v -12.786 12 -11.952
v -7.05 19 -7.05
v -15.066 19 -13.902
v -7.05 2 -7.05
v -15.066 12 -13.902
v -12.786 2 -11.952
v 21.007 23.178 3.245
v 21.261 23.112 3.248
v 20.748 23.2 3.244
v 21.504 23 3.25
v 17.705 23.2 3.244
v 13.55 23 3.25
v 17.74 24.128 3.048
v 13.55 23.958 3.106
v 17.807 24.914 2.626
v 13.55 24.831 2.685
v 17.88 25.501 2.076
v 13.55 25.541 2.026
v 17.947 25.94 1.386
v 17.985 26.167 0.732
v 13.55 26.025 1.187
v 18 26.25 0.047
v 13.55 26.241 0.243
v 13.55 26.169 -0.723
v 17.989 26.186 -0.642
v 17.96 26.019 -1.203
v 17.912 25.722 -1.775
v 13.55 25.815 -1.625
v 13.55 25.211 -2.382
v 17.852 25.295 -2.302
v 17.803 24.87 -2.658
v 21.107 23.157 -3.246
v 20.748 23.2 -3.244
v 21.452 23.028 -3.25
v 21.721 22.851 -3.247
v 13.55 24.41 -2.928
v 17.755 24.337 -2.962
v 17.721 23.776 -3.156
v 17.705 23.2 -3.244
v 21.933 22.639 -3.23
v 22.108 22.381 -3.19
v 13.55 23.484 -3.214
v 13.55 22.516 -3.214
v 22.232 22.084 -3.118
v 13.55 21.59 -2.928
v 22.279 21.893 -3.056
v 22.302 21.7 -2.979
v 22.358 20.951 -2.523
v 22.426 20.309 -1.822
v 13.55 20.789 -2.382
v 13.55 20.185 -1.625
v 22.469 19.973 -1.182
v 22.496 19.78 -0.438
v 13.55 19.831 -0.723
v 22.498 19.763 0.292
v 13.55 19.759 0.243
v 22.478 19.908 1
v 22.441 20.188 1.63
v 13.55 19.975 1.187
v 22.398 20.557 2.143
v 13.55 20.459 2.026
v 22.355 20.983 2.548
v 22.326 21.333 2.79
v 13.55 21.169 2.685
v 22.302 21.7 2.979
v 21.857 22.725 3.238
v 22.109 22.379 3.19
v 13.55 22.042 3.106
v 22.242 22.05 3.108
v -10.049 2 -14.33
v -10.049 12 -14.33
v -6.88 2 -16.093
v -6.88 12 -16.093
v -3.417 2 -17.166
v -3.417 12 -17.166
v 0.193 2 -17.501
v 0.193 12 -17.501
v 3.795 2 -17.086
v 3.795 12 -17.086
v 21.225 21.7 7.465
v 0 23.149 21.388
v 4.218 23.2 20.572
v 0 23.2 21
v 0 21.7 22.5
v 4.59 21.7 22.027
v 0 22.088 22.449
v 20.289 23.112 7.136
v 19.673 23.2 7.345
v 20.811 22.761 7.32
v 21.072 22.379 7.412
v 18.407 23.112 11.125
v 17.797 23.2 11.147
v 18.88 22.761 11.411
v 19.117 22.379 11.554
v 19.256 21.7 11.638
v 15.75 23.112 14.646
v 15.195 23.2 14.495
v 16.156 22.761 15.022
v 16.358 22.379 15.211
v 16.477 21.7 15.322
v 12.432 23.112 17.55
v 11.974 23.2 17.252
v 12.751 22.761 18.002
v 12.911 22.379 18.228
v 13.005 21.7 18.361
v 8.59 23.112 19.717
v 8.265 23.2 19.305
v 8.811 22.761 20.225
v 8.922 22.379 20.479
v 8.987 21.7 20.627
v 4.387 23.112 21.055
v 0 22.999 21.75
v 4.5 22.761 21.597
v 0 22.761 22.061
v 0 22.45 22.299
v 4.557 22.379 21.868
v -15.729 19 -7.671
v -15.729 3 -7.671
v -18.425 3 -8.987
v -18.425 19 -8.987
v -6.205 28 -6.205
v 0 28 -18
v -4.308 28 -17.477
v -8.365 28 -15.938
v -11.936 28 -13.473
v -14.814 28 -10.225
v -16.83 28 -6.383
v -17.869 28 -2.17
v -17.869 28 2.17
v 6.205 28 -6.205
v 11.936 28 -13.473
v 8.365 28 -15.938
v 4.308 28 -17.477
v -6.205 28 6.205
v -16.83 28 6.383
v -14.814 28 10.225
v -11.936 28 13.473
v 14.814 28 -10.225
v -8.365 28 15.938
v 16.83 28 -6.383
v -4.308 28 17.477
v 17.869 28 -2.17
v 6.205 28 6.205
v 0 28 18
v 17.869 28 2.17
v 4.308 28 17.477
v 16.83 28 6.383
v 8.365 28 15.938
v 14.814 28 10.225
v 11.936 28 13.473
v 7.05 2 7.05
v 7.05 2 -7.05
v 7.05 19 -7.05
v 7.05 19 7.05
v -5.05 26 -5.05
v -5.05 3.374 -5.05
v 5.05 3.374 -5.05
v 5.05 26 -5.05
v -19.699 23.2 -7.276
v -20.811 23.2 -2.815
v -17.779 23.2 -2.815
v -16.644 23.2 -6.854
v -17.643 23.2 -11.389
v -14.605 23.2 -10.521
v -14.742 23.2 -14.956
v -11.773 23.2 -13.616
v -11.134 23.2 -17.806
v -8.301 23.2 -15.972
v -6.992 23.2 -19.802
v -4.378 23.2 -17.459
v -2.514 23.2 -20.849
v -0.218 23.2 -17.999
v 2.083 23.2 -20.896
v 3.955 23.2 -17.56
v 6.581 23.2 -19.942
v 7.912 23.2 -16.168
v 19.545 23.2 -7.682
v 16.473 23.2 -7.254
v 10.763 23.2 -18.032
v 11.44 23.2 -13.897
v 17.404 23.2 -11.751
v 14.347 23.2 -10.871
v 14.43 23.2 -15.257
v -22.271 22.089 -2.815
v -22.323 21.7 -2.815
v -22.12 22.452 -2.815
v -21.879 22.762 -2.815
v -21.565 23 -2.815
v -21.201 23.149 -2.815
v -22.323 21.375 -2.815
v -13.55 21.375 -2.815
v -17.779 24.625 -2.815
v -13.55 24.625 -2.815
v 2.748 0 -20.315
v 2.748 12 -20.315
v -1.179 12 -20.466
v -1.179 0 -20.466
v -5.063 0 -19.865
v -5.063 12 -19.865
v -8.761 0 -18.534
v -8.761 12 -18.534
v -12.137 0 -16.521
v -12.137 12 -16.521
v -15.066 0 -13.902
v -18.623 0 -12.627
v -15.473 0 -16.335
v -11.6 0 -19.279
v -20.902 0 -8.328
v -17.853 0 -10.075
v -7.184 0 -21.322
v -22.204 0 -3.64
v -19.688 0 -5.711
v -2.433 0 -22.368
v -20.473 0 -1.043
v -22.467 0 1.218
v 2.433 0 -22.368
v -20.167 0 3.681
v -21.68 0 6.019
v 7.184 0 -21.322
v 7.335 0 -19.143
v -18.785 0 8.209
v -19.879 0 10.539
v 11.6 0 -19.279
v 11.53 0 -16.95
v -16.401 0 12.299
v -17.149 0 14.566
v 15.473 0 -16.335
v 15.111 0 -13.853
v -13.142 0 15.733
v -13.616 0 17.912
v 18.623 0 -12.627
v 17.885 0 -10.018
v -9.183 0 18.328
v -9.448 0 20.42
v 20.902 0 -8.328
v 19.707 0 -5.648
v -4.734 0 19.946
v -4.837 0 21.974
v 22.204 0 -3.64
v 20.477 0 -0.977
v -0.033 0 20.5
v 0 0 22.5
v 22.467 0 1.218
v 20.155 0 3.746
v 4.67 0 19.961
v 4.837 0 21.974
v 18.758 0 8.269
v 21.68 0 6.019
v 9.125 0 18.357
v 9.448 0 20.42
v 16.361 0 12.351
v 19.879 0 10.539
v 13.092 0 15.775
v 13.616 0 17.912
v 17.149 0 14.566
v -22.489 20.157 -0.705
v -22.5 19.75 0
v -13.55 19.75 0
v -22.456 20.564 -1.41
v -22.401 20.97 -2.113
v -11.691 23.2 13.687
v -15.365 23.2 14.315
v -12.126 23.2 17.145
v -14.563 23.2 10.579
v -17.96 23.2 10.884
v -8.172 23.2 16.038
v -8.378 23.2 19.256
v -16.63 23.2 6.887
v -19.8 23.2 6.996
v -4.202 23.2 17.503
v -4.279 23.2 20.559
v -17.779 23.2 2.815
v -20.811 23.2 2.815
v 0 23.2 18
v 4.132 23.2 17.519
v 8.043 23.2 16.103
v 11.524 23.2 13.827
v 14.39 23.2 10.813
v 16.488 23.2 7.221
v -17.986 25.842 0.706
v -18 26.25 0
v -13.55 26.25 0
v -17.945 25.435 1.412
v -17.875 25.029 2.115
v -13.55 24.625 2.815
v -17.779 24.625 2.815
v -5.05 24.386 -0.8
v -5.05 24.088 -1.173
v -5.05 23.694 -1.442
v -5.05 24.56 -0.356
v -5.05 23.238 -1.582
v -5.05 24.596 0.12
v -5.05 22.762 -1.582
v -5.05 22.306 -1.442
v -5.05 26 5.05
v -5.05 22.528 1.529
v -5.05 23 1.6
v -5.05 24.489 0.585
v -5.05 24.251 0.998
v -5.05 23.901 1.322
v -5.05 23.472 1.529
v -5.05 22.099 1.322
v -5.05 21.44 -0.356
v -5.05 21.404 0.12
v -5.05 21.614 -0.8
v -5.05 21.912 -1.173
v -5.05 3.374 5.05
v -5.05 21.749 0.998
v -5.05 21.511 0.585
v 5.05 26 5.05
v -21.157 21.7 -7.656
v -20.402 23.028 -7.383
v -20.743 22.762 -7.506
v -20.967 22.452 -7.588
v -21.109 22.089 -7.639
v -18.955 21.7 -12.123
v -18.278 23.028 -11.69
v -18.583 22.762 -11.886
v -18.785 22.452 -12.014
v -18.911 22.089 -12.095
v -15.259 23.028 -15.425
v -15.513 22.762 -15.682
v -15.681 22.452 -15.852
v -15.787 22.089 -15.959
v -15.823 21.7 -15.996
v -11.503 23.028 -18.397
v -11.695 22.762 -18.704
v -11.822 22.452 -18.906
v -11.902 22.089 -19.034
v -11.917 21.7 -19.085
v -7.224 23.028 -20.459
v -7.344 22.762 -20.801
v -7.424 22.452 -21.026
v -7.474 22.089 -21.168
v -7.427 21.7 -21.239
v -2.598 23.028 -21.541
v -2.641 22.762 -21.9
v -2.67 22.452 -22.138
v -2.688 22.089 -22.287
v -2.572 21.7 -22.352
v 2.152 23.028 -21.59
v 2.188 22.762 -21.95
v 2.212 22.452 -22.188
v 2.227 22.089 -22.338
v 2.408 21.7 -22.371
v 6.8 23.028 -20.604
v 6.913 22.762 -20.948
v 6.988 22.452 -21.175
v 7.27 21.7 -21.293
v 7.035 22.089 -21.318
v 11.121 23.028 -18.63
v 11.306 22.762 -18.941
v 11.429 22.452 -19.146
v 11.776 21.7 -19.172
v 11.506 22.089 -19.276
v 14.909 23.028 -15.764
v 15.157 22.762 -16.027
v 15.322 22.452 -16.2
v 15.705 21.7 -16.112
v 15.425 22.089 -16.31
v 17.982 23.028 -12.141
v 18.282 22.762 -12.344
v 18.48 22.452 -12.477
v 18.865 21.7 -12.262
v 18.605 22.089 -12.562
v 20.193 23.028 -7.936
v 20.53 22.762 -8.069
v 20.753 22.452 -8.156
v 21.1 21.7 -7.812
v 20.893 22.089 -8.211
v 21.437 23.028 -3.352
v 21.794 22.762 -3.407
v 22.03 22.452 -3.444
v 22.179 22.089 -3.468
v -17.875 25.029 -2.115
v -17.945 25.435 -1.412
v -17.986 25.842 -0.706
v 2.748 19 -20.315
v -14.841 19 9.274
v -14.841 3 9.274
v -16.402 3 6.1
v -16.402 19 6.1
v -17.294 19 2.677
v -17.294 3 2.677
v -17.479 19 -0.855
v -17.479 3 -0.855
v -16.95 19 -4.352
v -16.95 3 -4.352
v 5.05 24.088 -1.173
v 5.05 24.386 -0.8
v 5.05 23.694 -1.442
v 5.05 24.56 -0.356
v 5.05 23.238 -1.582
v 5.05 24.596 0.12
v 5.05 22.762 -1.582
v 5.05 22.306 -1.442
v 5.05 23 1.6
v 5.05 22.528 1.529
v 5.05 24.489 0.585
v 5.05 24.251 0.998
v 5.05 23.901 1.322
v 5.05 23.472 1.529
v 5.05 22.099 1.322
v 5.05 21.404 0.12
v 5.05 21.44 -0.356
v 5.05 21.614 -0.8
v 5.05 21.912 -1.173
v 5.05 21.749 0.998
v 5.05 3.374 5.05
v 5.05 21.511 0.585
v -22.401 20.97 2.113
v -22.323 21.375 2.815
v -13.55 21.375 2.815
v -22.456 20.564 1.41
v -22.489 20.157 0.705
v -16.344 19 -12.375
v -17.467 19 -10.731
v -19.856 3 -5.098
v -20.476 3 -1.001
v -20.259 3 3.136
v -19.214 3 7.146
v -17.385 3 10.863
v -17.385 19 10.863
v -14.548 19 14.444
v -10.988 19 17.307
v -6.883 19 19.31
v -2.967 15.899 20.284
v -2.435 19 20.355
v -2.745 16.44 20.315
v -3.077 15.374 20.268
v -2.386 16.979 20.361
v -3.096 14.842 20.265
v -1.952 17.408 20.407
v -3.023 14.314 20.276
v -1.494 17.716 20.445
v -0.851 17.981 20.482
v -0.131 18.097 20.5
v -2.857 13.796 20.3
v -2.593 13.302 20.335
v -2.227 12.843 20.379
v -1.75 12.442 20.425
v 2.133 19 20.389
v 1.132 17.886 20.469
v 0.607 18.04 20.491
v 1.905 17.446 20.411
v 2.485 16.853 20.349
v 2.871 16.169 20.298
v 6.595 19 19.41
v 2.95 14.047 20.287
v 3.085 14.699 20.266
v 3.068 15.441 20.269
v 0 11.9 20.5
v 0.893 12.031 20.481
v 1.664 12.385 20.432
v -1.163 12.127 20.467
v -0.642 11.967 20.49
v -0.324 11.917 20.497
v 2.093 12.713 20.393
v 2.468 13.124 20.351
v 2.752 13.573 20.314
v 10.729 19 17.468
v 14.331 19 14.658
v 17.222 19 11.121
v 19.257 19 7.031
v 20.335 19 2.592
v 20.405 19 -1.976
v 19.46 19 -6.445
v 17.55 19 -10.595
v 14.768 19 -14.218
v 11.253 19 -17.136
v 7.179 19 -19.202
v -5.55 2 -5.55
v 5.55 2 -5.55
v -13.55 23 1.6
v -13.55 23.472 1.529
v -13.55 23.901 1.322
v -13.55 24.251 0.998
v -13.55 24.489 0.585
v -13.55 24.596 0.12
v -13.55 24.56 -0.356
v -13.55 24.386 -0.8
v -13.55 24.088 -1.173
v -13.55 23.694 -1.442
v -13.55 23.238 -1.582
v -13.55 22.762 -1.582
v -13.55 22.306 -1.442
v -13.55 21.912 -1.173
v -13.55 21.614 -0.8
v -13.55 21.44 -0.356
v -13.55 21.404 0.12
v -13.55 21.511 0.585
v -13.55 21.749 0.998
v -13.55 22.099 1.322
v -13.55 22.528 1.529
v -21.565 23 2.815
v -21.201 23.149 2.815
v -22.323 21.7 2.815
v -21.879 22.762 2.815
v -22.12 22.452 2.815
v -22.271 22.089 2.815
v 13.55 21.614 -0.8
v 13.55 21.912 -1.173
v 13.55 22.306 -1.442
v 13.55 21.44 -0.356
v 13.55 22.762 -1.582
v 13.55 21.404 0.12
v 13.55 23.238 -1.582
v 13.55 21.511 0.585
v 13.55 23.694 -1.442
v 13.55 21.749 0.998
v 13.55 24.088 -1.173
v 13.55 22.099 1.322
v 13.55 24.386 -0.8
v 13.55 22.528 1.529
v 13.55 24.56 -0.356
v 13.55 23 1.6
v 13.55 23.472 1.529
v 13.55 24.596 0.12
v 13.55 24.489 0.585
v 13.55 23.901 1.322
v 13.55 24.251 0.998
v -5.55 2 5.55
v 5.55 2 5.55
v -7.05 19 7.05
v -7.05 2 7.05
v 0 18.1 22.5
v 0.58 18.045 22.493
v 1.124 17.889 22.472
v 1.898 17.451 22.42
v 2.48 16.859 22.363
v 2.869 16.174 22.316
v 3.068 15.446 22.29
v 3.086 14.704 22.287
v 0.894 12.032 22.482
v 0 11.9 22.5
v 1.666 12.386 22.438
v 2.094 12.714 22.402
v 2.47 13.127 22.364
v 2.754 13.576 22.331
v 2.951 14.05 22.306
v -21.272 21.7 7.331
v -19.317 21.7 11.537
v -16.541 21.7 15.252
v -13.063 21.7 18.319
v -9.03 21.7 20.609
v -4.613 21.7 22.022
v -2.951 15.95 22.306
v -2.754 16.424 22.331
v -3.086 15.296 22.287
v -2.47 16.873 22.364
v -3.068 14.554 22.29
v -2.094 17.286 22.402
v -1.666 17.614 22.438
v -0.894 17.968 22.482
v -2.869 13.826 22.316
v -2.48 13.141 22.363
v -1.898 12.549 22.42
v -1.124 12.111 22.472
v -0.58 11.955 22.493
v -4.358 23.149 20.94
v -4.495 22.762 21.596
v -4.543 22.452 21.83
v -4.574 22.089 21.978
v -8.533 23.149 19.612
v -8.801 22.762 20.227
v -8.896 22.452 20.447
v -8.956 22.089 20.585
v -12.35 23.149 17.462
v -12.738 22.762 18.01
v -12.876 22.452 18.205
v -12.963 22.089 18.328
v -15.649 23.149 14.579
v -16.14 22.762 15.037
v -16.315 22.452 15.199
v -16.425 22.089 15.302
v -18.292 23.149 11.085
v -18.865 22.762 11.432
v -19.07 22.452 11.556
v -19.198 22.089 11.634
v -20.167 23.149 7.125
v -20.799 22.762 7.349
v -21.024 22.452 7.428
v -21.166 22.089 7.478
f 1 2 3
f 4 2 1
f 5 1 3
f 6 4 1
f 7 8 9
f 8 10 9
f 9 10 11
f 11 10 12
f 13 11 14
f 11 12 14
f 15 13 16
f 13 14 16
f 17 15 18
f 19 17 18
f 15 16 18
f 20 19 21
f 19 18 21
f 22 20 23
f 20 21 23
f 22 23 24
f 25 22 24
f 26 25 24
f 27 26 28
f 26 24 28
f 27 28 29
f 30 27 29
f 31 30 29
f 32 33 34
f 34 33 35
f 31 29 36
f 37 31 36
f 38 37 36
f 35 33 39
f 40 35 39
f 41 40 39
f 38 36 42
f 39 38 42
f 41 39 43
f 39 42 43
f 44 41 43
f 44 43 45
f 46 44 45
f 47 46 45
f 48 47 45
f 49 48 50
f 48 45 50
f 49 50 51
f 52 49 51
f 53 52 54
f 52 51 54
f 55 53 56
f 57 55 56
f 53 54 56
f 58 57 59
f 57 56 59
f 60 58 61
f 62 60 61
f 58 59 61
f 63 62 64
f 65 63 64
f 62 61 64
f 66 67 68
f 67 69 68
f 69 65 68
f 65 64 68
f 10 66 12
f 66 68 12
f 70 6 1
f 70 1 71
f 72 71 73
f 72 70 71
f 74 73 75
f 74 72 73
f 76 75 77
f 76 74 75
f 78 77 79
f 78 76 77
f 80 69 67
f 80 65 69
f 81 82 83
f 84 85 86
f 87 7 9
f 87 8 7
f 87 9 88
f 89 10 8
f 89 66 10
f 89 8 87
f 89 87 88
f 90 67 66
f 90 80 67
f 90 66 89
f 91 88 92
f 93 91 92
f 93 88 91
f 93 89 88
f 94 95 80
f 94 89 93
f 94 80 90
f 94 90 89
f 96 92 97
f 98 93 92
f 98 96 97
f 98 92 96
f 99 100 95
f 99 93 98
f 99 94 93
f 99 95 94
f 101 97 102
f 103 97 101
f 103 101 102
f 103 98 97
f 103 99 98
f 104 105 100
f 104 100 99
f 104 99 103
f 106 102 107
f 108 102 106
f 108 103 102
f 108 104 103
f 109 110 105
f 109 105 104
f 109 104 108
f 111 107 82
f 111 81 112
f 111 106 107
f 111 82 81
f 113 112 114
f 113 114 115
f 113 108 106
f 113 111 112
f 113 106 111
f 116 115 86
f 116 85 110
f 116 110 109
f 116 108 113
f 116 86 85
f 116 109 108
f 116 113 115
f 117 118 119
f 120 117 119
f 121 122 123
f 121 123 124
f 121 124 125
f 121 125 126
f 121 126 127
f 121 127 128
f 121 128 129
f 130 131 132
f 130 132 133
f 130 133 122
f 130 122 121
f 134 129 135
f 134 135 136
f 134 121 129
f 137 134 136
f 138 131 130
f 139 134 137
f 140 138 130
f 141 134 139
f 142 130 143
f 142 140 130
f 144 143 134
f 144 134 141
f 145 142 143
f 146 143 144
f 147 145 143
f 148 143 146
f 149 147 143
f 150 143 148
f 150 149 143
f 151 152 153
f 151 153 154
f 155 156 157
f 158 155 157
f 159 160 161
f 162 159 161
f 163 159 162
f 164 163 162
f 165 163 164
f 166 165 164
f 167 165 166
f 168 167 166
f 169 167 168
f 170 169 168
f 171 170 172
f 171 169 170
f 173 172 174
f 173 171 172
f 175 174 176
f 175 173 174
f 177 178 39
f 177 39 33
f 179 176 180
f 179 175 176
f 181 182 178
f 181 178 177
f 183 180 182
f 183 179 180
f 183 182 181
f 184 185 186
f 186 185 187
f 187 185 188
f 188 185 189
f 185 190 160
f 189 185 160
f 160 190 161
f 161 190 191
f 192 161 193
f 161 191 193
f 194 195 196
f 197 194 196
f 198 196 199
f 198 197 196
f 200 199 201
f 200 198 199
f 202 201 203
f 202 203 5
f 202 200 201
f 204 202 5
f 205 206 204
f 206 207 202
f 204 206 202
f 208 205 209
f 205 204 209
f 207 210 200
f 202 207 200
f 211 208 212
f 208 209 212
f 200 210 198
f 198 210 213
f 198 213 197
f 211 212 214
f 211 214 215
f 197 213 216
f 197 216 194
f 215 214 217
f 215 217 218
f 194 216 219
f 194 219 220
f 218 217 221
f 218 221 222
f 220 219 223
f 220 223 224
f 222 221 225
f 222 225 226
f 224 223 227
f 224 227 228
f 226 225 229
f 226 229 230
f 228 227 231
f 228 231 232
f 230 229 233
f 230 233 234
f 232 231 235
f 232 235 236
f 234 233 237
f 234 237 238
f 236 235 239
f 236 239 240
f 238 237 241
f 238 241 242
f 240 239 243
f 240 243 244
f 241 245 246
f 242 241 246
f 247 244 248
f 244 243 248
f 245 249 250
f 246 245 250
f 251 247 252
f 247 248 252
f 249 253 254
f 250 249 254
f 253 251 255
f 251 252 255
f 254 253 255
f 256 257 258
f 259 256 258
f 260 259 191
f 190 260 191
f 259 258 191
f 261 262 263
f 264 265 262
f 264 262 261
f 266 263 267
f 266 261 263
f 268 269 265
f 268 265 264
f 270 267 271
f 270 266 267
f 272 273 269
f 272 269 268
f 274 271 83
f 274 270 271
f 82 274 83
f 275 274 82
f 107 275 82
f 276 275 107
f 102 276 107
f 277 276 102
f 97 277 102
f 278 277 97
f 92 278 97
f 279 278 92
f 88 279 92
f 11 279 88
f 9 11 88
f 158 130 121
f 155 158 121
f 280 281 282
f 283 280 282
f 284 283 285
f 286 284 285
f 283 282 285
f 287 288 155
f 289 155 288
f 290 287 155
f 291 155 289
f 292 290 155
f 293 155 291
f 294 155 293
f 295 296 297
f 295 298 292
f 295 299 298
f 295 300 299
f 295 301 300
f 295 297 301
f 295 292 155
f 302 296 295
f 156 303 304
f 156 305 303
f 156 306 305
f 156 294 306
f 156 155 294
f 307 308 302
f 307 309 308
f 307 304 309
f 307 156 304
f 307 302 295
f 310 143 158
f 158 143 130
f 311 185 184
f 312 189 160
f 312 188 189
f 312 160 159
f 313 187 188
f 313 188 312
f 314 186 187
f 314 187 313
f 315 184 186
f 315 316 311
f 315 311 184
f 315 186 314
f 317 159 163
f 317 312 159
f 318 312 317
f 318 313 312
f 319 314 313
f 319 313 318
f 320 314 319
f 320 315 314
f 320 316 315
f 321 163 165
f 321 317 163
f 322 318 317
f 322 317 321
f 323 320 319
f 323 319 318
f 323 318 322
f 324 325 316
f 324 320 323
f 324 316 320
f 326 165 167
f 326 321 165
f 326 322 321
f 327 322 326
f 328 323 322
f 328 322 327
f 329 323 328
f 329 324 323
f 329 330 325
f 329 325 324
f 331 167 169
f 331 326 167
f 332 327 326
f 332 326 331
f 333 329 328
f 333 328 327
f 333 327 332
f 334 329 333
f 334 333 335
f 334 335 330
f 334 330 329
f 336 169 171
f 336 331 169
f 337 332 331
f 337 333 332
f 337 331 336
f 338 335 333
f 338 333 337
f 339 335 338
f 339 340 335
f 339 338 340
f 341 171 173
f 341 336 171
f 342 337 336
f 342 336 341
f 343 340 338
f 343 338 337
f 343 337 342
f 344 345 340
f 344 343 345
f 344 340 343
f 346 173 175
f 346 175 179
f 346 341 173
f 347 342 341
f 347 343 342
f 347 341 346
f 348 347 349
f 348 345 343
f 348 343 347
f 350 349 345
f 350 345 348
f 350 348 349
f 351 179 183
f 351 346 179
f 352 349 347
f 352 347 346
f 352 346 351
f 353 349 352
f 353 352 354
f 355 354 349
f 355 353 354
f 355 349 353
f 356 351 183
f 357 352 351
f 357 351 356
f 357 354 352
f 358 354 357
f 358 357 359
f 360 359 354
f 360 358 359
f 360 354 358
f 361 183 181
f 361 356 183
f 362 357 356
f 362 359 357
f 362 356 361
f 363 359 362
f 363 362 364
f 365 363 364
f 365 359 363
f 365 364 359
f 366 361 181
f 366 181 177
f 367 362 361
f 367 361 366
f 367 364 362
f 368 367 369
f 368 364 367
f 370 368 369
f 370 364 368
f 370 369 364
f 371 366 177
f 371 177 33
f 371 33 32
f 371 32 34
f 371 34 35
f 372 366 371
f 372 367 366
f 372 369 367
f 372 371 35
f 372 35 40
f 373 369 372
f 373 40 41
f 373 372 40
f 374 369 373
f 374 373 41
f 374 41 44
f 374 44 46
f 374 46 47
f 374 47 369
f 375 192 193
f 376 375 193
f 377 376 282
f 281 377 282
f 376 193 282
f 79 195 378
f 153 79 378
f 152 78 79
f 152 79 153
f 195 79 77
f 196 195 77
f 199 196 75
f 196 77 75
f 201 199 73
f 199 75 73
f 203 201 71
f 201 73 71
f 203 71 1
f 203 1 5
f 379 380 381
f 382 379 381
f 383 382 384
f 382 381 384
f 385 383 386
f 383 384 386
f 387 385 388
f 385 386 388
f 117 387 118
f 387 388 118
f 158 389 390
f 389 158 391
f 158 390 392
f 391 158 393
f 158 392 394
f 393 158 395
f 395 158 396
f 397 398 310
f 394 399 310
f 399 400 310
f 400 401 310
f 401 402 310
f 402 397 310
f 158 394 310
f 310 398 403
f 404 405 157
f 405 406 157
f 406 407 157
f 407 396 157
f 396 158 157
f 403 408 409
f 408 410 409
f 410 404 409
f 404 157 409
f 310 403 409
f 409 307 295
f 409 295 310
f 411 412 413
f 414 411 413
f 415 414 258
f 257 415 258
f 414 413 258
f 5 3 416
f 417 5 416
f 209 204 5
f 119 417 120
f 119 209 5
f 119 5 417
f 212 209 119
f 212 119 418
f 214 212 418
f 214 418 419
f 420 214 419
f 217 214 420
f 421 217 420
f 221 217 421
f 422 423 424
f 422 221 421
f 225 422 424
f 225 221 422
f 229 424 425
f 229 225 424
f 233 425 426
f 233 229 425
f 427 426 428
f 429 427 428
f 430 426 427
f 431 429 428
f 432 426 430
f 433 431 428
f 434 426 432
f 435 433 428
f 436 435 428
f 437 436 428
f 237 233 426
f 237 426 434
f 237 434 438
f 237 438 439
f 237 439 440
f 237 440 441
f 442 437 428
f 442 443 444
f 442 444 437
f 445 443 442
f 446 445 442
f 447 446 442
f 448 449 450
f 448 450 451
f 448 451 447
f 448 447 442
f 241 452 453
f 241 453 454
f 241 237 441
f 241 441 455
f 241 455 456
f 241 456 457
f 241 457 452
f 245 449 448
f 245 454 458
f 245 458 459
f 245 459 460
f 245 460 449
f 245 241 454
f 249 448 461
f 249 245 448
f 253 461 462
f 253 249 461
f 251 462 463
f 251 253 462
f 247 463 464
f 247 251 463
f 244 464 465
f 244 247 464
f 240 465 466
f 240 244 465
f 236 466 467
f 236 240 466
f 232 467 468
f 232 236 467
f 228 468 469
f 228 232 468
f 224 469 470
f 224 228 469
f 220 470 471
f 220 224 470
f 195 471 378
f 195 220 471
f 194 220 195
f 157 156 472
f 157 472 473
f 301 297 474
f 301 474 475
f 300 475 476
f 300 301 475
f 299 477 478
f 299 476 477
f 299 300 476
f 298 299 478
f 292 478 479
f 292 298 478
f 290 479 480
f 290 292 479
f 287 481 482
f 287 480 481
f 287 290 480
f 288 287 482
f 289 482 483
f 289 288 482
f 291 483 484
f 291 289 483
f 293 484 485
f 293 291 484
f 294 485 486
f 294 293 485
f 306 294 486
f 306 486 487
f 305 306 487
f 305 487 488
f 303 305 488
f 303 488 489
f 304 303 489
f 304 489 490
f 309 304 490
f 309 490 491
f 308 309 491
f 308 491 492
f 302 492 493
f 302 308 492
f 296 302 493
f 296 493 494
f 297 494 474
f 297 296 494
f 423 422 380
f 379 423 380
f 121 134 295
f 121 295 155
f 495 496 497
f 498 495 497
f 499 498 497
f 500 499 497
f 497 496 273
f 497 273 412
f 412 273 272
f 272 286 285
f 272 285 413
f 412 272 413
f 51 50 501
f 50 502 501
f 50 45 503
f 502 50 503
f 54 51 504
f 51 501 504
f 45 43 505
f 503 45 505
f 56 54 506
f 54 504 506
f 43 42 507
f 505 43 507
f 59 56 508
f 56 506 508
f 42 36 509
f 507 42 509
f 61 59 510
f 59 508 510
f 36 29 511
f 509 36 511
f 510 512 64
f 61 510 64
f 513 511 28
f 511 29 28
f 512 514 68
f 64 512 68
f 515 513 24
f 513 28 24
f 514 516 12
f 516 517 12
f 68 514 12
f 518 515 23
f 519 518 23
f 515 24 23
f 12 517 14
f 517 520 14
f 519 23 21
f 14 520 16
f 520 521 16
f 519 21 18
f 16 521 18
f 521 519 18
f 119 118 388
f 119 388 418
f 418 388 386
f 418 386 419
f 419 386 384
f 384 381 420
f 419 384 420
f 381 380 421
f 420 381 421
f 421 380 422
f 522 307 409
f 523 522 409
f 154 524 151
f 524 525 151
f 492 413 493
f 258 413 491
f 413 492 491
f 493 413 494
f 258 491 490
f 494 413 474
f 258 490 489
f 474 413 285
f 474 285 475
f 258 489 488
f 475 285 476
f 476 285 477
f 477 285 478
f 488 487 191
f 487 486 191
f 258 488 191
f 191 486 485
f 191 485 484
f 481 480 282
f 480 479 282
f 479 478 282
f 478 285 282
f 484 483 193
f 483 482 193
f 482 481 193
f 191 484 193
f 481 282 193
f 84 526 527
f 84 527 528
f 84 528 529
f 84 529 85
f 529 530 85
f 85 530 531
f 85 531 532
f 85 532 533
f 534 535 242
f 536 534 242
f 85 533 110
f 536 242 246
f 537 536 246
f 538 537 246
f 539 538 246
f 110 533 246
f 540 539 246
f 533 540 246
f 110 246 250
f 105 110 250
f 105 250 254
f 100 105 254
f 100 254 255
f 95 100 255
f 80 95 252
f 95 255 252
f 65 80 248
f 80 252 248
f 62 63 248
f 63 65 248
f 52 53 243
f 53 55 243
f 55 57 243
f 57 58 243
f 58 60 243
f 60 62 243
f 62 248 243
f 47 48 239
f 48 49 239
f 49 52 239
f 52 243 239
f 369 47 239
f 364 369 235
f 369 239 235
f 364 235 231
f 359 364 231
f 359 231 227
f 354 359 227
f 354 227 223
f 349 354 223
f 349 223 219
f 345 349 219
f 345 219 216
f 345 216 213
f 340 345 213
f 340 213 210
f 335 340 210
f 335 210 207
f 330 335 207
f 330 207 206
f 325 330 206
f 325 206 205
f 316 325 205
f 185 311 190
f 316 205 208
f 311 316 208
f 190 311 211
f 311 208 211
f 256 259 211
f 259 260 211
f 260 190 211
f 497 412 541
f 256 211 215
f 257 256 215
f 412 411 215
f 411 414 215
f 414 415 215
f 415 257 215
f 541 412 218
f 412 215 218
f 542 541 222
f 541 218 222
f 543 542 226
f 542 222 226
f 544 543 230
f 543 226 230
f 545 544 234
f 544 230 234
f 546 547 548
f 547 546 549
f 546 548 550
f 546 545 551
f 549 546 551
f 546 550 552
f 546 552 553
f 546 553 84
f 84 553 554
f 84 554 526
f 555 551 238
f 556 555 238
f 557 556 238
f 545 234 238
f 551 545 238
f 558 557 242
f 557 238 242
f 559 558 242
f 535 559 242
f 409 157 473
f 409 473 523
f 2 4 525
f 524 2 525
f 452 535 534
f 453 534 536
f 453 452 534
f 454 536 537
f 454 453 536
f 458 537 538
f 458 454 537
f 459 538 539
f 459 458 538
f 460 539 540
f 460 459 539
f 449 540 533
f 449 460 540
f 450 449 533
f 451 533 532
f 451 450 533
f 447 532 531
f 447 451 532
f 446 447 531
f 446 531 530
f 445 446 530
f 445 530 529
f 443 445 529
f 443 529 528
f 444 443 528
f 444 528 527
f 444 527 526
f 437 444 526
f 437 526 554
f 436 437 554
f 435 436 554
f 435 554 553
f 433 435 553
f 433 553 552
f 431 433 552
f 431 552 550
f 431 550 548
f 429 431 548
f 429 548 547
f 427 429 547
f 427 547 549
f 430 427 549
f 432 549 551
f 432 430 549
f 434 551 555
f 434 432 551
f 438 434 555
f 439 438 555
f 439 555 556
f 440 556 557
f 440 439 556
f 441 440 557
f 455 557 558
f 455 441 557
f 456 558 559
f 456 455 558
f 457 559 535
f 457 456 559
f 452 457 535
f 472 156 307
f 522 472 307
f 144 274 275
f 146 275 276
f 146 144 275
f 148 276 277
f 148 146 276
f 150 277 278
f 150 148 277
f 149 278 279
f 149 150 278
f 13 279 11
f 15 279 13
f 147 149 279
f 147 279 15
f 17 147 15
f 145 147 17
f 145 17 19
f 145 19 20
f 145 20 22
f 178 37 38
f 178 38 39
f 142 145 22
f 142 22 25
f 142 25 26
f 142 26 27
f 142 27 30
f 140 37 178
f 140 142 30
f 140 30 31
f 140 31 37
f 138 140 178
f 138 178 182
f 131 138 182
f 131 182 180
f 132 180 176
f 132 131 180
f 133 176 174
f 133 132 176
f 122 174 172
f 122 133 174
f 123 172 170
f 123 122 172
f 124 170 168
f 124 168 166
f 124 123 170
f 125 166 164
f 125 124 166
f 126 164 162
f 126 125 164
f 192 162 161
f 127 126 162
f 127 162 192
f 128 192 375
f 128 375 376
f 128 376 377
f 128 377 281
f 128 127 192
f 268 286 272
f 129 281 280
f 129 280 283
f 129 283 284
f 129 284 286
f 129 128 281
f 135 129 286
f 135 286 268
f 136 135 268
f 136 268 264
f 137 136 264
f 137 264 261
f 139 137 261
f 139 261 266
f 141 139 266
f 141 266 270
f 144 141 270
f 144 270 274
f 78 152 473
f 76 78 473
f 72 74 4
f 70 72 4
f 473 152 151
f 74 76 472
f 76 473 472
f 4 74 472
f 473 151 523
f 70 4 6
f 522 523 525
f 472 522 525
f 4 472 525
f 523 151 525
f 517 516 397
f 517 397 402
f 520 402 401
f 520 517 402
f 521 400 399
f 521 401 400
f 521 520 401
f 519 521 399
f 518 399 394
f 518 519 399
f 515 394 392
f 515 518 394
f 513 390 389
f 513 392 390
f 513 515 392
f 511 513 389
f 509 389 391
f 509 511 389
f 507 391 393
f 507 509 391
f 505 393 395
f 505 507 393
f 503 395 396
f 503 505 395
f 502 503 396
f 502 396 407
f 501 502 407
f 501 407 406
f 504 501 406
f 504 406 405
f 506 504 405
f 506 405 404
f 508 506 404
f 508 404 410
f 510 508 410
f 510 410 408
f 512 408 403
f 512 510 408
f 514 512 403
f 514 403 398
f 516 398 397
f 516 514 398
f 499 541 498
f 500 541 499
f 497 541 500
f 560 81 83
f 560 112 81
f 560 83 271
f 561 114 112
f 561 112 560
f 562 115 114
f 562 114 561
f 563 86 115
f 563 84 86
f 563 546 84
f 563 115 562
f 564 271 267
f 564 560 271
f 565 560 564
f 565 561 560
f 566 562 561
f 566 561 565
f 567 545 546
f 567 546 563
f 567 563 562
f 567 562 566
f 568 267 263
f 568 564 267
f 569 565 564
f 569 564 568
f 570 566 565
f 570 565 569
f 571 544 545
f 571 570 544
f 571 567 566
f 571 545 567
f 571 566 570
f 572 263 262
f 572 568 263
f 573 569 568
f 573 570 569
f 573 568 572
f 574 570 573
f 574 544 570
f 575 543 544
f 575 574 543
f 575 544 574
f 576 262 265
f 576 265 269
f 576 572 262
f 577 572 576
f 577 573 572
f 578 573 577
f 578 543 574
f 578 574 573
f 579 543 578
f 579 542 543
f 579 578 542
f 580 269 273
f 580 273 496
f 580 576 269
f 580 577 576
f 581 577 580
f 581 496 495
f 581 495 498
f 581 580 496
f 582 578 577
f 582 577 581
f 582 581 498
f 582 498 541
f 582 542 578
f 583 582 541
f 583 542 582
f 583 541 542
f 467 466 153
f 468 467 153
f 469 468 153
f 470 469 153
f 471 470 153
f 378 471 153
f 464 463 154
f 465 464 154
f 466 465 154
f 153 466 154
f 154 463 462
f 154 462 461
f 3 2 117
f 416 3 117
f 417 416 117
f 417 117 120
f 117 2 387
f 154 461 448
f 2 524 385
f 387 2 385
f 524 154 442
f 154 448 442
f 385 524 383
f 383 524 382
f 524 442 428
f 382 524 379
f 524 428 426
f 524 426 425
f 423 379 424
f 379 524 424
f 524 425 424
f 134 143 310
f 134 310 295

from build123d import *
from OCP.BRepFilletAPI import BRepFilletAPI_MakeChamfer

# Parameters (mm, degrees)
SKETCH1_R                = 22.5
BOSS_EXTRUDE1_DEPTH      = 28
SKETCH2_W                = 10.1
SKETCH2_H                = 10.1
CUT_EXTRUDE2_DEPTH       = 43.385138905
SHELL3_T                 = -2
SKETCH3_R                = 3.1
CUT_EXTRUDE3_DEPTH       = 47.51292831
CHAMFER1_SIZE            = 2
CHAMFER1_SIZE2           = 1.154700538
BOSS_EXTRUDE8_START      = 23
BOSS_EXTRUDE8_DEPTH      = 23
BOSS_EXTRUDE4_DEPTH      = 20
BOSS_EXTRUDE6_DEPTH      = 26
CUT_EXTRUDE5_DEPTH       = 12
CUT_EXTRUDE9_DEPTH       = 2
BOSS_EXTRUDE10_START     = 7
BOSS_EXTRUDE10_DEPTH     = 7
SKETCH21_OUTSIDE_W       = 61.262
SKETCH21_OUTSIDE_H       = 63.965
SKETCH21_OUTSIDE_R       = 18
CUT_EXTRUDE11_DEPTH      = 4.8
CUT_EXTRUDE12_DEPTH      = 47.67125763
CUT_EXTRUDE12_DEPTH_BACK = 47.67125763
SKETCH22_R               = 1.6
CUT_EXTRUDE13_START      = -8.5
SKETCH24_R               = 3.25
CUT_EXTRUDE13_DEPTH      = 39.17125769
CUT_EXTRUDE14_START      = -8.5
CUT_EXTRUDE14_DEPTH      = 39.171257692
FILLET1_R                = 1.5
SKETCH26_R               = 43.919943133
SKETCH26_R_2             = 22.5
CUT_EXTRUDE15_DEPTH      = 44.879993089
CHAMFER2_SIZE            = 0.5
CHAMFER2_SIZE2           = 1.37373871


with BuildPart() as part:
    # Sketch1 → Boss-Extrude1 (new body)
    with BuildSketch(Plane(origin=(0, 0, 0), x_dir=(1, 0, 0), z_dir=(0, 1, 0))):
        with Locations(Location((0, 0, 0), (0, 0, 270))):
            Circle(SKETCH1_R)
    extrude(amount=BOSS_EXTRUDE1_DEPTH)

    # Sketch2 → Cut-Extrude2 (cut, through all)
    with BuildSketch(Plane.XZ):
        Rectangle(SKETCH2_W, SKETCH2_H)
    extrude(amount=-CUT_EXTRUDE2_DEPTH, mode=Mode.SUBTRACT)

    # Shell3
    shell3_openings = [part.faces().sort_by_distance(p)[0] for p in [
        (0, 0, -21.863603897),
    ]]
    offset(amount=SHELL3_T, openings=shell3_openings, kind=Kind.INTERSECTION)

    # Sketch3 → Cut-Extrude3 (cut, through all)
    with BuildSketch(Plane.XY.offset(7.05)):
        with Locations(Location((0, 15, 0), (0, 0, 270.000000016))):
            Circle(SKETCH3_R)
    extrude(amount=CUT_EXTRUDE3_DEPTH, mode=Mode.SUBTRACT)

    # Chamfer1: one chamfer whose edges measure the first distance from different faces: ONE call of the kernel's chamfer builder (chamfer() names one face for all edges)
    chamfer1_edges_1 = [part.edges().sort_by_distance(p)[0] for p in [
        (5.05, 28, 0),
    ]]
    chamfer1_side_1 = [part.faces().sort_by_distance(p)[0] for p in [
        (5.05, 14, 0),
    ]]
    chamfer1_edges_2 = [part.edges().sort_by_distance(p)[0] for p in [
        (0, 28, -5.05),
    ]]
    chamfer1_side_2 = [part.faces().sort_by_distance(p)[0] for p in [
        (0, 14, -5.05),
    ]]
    chamfer1_edges_3 = [part.edges().sort_by_distance(p)[0] for p in [
        (-5.05, 28, 0),
    ]]
    chamfer1_side_3 = [part.faces().sort_by_distance(p)[0] for p in [
        (-5.05, 14, 0),
    ]]
    chamfer1_edges_4 = [part.edges().sort_by_distance(p)[0] for p in [
        (0, 28, 5.05),
    ]]
    chamfer1_side_4 = [part.faces().sort_by_distance(p)[0] for p in [
        (0, 14, 5.05),
    ]]
    chamfer1 = BRepFilletAPI_MakeChamfer(part.part.solid().wrapped)
    for e in chamfer1_edges_1:
        chamfer1.Add(CHAMFER1_SIZE, CHAMFER1_SIZE2, e.wrapped, chamfer1_side_1[0].wrapped)  # the first distance lies on this face
    for e in chamfer1_edges_2:
        chamfer1.Add(CHAMFER1_SIZE, CHAMFER1_SIZE2, e.wrapped, chamfer1_side_2[0].wrapped)  # the first distance lies on this face
    for e in chamfer1_edges_3:
        chamfer1.Add(CHAMFER1_SIZE, CHAMFER1_SIZE2, e.wrapped, chamfer1_side_3[0].wrapped)  # the first distance lies on this face
    for e in chamfer1_edges_4:
        chamfer1.Add(CHAMFER1_SIZE, CHAMFER1_SIZE2, e.wrapped, chamfer1_side_4[0].wrapped)  # the first distance lies on this face
    add(Compound.cast(chamfer1.Shape()), mode=Mode.REPLACE)

    # Sketch18 → Boss-Extrude8 (add)
    with BuildSketch(Plane.XZ.offset(-26).offset(BOSS_EXTRUDE8_START)):
        with BuildLine():
            Line((-15.72889581, -7.671495069), (-18.425277949, -8.986608509))
            ThreePointArc((-18.425277949, -8.986608509), (-20.471905462, 1.072887103), (-17.384985971, 10.863344917))
            Line((-17.384985971, 10.863344917), (-14.840841683, 9.273587124))
            ThreePointArc((-14.840841683, 9.273587124), (-17.476016858, 0.915879234), (-15.72889581, -7.671495069))
        make_face()
    extrude(amount=-BOSS_EXTRUDE8_DEPTH)

    # Sketch9 → Boss-Extrude4 (add)
    with BuildSketch(Plane.XZ):
        Polygon((2.070380013, -22.404542544), (-16.587666088, -15.201951643), (-17.668054723, -18.000658558), (0.989991378, -25.203249459), align=None)
    extrude(amount=-BOSS_EXTRUDE4_DEPTH)

    # Sketch11 → Boss-Extrude6 (add)
    with BuildSketch(Plane.XZ):
        with BuildLine():
            Line((2.070380013, -22.404542544), (7.05, -7.05))
            Line((7.05, -7.05), (-7.05, -7.05))
            Line((-7.05, -7.05), (-16.587666088, -15.201951643))
            ThreePointArc((-16.587666088, -15.201951643), (-8.102914764, -20.990301864), (2.070380013, -22.404542544))
        make_face()
    extrude(amount=-BOSS_EXTRUDE6_DEPTH)

    # Sketch12 → Cut-Extrude5 (cut)
    with BuildSketch(Plane.XZ):
        with BuildLine():
            Line((3.795196001, -17.086112517), (2.74804579, -20.314975863))
            ThreePointArc((2.74804579, -20.314975863), (-6.94389773, -19.288138436), (-15.066327631, -13.901646367))
            Line((-15.066327631, -13.901646367), (-12.785820172, -11.952470714))
            ThreePointArc((-12.785820172, -11.952470714), (-5.176523958, -16.719520129), (3.795196001, -17.086112517))
        make_face()
    extrude(amount=-CUT_EXTRUDE5_DEPTH, mode=Mode.SUBTRACT)

    # Sketch17 → Cut-Extrude9 (cut)
    with BuildSketch(Plane.XZ):
        with BuildLine():
            Line((7.05, 7.05), (7.05, -7.05))
            Line((7.05, -7.05), (3.795196001, -17.086112517))
            ThreePointArc((3.795196001, -17.086112517), (-5.176523958, -16.719520129), (-12.785820172, -11.952470714))
            Line((-12.785820172, -11.952470714), (-7.05, -7.05))
            Line((-7.05, -7.05), (-7.05, 7.05))
            Line((-7.05, 7.05), (7.05, 7.05))
        make_face()
    extrude(amount=-CUT_EXTRUDE9_DEPTH, mode=Mode.SUBTRACT)

    # Sketch20 → Boss-Extrude10 (add)
    with BuildSketch(Plane.XZ.offset(-26).offset(BOSS_EXTRUDE10_START)):
        with BuildLine():
            Line((2.74804579, -20.314975863), (7.05, -7.05))
            Line((7.05, -7.05), (7.05, 7.05))
            Line((7.05, 7.05), (-7.05, 7.05))
            Line((-7.05, 7.05), (-7.05, -7.05))
            Line((-7.05, -7.05), (-15.066327631, -13.901646367))
            ThreePointArc((-15.066327631, -13.901646367), (6.94389773, 19.288138436), (2.74804579, -20.314975863))
        make_face()
    extrude(amount=-BOSS_EXTRUDE10_DEPTH)

    # Sketch21 outside → Cut-Extrude11 (cut)
    with BuildSketch(Plane(origin=(0, 28, 0), x_dir=(1, 0, 0), z_dir=(0, 1, 0))):
        with Locations((0, 1.3515)):
            Rectangle(SKETCH21_OUTSIDE_W, SKETCH21_OUTSIDE_H)
        with Locations(Location((0, 0, 0), (0, 0, 270))):
            Circle(SKETCH21_OUTSIDE_R, mode=Mode.SUBTRACT)
    extrude(amount=-CUT_EXTRUDE11_DEPTH, mode=Mode.SUBTRACT)

    # Sketch22 → Cut-Extrude12 (cut, two sides: drawn at the far end of the back side and taken through both)
    with BuildSketch(Plane.ZY.offset(-5.05).offset(-CUT_EXTRUDE12_DEPTH_BACK)):
        with Locations((0, 23)):
            Circle(SKETCH22_R)
    extrude(amount=CUT_EXTRUDE12_DEPTH + CUT_EXTRUDE12_DEPTH_BACK, mode=Mode.SUBTRACT)

    # Sketch24 → Cut-Extrude13 (cut, through all)
    with BuildSketch(Plane.ZY.offset(-5.05).offset(CUT_EXTRUDE13_START)):
        with Locations((0, 23)):
            Circle(SKETCH24_R)
    extrude(amount=-CUT_EXTRUDE13_DEPTH, mode=Mode.SUBTRACT)

    # Sketch25 → Cut-Extrude14 (cut, through all)
    with BuildSketch(Plane(origin=(-5.05, 0, 0), x_dir=(0, 0, -1), z_dir=(1, 0, 0)).offset(CUT_EXTRUDE14_START)):
        Polygon((0, 19.75), (2.814582562, 21.375), (2.814582562, 24.625), (0, 26.25), (-2.814582562, 24.625), (-2.814582562, 21.375), align=None)
    extrude(amount=-CUT_EXTRUDE14_DEPTH, mode=Mode.SUBTRACT)

    # Fillet1
    # the kernel refuses this fillet: 1.5 mm, written as the material it takes off along each edge
    with BuildSketch(Plane(origin=(0, 23.2, 0), x_dir=(0, 0, 1), z_dir=(1, 0, 0))) as fillet1_piece_1:
        with BuildLine():
            CenterArc((22.5 - FILLET1_R, FILLET1_R), FILLET1_R, 270, 90)
            Line((22.5, FILLET1_R), (22.5, 0))
            Line((22.5, 0), (22.5 - FILLET1_R, 0))
        make_face()
    revolve(axis=Axis((0, 23.2, 0), (0, -1, 0)), revolution_arc=92.366443414, mode=Mode.SUBTRACT)
    with BuildSketch(Plane(origin=(0, 23.2, 0), x_dir=(-0.9991402664664062, 0, 0.041457543649361384), z_dir=(0.041457543649361384, 0, 0.9991402664664062))) as fillet1_piece_2:
        with BuildLine():
            CenterArc((22.5 - FILLET1_R, FILLET1_R), FILLET1_R, 270, 90)
            Line((22.5, FILLET1_R), (22.5, 0))
            Line((22.5, 0), (22.5 - FILLET1_R, 0))
        make_face()
    revolve(axis=Axis((0, 23.2, 0), (0, -1, 0)), revolution_arc=183.648889302, mode=Mode.SUBTRACT)
    with BuildSketch(Plane(origin=(0, 23.2, 0), x_dir=(0.9997569746526436, 0, -0.022045217925738058), z_dir=(-0.022045217925738058, 0, -0.9997569746526436))) as fillet1_piece_3:
        with BuildLine():
            CenterArc((22.5 - FILLET1_R, FILLET1_R), FILLET1_R, 270, 90)
            Line((22.5, FILLET1_R), (22.5, 0))
            Line((22.5, 0), (22.5 - FILLET1_R, 0))
        make_face()
    revolve(axis=Axis((0, 23.2, 0), (0, -1, 0)), revolution_arc=91.263200277, mode=Mode.SUBTRACT)

    # Sketch26 → Cut-Extrude15 (cut, through all)
    with BuildSketch(Plane.XZ):
        Circle(SKETCH26_R)
        with Locations(Location((0, 0, 0), (0, 0, 352.392535773))):
            Circle(SKETCH26_R_2, mode=Mode.SUBTRACT)
    extrude(amount=-CUT_EXTRUDE15_DEPTH, mode=Mode.SUBTRACT)

    # Chamfer2
    chamfer2_edges = [part.edges().sort_by_distance(p)[0] for p in [
        (0, 2, 5.05),
        (-5.05, 2, 0),
        (0, 2, -5.05),
        (5.05, 2, 0),
    ]]
    chamfer2_side = [part.faces().sort_by_distance(p)[0] for p in [
        (-1.341973038, 2, -7.273001119),
    ]]
    chamfer(chamfer2_edges, length=CHAMFER2_SIZE, length2=CHAMFER2_SIZE2, reference=chamfer2_side[0])


solid = part.part
